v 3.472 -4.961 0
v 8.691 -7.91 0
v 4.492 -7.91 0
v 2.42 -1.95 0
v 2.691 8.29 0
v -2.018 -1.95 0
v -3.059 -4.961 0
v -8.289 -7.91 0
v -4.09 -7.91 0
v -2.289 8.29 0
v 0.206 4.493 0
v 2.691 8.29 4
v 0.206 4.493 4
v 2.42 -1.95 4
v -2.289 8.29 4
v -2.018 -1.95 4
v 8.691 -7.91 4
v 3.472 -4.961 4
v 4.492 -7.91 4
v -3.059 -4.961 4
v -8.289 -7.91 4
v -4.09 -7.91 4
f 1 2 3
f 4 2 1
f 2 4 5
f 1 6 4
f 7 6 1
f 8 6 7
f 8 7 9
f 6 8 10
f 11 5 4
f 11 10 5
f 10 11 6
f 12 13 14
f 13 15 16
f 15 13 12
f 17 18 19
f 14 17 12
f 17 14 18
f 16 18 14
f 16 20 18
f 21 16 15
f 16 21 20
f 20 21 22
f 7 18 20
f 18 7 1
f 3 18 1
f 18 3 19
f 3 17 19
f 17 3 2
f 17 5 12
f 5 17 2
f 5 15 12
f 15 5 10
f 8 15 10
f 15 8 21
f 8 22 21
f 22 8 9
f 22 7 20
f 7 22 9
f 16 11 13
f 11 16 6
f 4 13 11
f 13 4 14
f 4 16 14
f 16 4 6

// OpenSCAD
$fn = 50;

difference() {
	union() {
		linear_extrude(height = 4) {
			text(font = "DejaVu Sans:style=Bold", halign = "center", size = 16, text = "A", valign = "center");
		}
	}
	union();
}
